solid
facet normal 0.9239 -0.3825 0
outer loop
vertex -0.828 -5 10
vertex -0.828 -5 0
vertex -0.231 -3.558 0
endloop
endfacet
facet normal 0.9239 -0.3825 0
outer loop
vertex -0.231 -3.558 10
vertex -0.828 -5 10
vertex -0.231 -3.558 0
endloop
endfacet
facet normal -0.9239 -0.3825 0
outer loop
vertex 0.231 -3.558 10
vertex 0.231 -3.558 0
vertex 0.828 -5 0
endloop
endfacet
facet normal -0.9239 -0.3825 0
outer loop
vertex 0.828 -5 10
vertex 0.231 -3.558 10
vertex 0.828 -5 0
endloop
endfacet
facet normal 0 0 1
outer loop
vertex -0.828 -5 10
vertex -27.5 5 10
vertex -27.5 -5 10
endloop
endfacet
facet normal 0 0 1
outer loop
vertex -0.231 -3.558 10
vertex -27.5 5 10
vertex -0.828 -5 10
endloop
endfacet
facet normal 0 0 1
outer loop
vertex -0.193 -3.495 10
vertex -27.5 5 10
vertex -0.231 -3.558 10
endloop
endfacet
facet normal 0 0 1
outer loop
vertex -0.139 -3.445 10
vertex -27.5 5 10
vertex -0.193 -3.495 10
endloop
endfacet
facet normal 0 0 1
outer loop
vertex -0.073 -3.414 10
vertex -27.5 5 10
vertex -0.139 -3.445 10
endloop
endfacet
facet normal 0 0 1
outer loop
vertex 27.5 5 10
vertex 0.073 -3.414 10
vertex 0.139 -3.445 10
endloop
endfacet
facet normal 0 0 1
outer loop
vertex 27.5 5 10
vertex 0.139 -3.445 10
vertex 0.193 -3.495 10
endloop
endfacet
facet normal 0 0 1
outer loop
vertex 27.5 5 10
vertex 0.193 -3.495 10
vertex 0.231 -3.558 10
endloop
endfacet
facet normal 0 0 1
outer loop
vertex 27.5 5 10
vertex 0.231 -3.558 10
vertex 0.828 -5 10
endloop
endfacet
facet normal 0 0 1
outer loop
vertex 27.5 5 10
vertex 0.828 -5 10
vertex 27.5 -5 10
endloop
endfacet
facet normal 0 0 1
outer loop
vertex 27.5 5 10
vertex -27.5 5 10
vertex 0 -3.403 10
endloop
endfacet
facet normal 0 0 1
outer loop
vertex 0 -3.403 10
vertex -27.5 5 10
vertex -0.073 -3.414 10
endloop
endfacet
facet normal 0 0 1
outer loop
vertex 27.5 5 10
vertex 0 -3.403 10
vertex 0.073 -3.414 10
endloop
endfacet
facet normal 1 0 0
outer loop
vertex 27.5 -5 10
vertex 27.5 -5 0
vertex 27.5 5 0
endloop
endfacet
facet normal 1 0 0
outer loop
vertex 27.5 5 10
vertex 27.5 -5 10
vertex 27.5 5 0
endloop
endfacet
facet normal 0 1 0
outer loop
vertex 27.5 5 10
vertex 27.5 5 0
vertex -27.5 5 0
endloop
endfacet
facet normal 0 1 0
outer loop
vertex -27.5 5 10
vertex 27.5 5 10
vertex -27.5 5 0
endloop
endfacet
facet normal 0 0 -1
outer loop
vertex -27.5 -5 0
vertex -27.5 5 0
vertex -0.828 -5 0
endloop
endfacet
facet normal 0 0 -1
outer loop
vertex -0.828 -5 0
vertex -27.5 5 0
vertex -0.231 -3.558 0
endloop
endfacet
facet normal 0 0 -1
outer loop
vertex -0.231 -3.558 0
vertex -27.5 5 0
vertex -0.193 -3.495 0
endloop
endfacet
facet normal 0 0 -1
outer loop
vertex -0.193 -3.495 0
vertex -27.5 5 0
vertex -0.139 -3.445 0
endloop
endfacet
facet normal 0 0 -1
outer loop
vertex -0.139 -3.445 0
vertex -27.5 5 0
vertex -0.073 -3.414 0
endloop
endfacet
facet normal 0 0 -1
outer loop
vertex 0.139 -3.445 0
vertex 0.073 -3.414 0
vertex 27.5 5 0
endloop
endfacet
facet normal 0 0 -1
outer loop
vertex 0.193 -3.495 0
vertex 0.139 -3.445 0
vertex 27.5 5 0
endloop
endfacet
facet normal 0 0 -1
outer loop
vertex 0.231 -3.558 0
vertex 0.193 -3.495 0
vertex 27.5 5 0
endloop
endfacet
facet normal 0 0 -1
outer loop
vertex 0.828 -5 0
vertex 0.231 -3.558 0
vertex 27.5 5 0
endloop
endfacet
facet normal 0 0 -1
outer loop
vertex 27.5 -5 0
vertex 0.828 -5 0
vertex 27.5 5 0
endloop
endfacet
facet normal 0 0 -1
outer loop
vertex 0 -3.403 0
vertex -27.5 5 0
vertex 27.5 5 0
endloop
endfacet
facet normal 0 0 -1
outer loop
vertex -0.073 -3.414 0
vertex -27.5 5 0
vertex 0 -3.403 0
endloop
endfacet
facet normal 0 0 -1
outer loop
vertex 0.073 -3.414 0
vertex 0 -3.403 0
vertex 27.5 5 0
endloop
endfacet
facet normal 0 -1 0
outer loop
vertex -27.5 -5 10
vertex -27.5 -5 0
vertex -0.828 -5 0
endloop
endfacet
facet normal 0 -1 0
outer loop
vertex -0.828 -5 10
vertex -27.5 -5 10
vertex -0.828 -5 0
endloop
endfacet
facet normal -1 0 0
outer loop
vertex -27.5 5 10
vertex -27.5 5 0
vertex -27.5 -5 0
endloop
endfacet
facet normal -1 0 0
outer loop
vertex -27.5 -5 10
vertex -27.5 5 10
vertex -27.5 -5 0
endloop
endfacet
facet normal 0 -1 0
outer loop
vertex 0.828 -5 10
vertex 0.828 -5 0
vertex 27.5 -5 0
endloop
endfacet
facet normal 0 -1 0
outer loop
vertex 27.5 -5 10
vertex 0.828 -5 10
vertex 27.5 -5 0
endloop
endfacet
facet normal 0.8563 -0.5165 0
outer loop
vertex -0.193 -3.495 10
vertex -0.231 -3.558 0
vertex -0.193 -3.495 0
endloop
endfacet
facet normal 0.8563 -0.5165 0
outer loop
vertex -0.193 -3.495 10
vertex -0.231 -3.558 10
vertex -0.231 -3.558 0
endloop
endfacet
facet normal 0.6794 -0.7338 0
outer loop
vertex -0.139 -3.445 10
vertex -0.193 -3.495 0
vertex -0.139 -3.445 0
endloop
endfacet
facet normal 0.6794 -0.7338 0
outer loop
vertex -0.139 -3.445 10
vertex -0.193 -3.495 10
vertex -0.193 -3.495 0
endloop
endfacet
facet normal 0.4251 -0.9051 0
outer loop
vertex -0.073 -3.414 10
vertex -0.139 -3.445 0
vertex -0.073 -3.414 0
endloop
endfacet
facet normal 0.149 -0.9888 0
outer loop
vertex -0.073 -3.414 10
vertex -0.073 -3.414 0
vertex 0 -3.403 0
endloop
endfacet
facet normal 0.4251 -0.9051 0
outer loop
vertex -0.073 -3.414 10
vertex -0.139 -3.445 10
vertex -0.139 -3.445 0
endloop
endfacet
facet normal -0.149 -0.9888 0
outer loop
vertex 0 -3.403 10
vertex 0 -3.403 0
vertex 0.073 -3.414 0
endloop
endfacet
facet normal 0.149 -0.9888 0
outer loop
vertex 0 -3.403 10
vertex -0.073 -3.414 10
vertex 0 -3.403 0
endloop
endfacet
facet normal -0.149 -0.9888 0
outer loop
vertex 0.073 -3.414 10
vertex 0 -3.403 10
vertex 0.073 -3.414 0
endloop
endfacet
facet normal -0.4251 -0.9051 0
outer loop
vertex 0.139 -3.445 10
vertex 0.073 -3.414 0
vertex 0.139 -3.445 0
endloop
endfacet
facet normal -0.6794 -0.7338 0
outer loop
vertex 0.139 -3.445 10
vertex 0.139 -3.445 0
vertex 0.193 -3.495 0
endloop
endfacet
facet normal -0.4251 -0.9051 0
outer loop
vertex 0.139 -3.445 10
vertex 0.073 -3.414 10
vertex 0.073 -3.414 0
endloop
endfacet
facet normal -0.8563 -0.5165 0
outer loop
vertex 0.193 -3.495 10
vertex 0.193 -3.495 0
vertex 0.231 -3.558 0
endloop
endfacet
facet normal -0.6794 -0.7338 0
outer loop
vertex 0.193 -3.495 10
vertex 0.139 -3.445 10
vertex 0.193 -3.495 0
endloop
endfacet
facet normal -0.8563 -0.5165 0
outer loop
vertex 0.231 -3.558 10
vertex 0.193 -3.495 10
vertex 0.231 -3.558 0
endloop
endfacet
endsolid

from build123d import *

# Parameters (mm, degrees)
F1_DEPTH = 10
F2_R     = 0.25


with BuildPart() as f1:
    # F0 (on Top) → F1 (new body)
    with BuildSketch(Plane.XY):
        Polygon((27.5, 5), (-27.5, 5), (-27.5, -5), (-0.828427, -5), (0, -3), (0.828427, -5), (27.5, -5), align=None)
    extrude(amount=F1_DEPTH)

    # F2
    f2_edges = [f1.edges().sort_by_distance(p)[0] for p in [
        (0, -3, 5),
    ]]
    fillet(f2_edges, radius=F2_R)


solid = f1.part
